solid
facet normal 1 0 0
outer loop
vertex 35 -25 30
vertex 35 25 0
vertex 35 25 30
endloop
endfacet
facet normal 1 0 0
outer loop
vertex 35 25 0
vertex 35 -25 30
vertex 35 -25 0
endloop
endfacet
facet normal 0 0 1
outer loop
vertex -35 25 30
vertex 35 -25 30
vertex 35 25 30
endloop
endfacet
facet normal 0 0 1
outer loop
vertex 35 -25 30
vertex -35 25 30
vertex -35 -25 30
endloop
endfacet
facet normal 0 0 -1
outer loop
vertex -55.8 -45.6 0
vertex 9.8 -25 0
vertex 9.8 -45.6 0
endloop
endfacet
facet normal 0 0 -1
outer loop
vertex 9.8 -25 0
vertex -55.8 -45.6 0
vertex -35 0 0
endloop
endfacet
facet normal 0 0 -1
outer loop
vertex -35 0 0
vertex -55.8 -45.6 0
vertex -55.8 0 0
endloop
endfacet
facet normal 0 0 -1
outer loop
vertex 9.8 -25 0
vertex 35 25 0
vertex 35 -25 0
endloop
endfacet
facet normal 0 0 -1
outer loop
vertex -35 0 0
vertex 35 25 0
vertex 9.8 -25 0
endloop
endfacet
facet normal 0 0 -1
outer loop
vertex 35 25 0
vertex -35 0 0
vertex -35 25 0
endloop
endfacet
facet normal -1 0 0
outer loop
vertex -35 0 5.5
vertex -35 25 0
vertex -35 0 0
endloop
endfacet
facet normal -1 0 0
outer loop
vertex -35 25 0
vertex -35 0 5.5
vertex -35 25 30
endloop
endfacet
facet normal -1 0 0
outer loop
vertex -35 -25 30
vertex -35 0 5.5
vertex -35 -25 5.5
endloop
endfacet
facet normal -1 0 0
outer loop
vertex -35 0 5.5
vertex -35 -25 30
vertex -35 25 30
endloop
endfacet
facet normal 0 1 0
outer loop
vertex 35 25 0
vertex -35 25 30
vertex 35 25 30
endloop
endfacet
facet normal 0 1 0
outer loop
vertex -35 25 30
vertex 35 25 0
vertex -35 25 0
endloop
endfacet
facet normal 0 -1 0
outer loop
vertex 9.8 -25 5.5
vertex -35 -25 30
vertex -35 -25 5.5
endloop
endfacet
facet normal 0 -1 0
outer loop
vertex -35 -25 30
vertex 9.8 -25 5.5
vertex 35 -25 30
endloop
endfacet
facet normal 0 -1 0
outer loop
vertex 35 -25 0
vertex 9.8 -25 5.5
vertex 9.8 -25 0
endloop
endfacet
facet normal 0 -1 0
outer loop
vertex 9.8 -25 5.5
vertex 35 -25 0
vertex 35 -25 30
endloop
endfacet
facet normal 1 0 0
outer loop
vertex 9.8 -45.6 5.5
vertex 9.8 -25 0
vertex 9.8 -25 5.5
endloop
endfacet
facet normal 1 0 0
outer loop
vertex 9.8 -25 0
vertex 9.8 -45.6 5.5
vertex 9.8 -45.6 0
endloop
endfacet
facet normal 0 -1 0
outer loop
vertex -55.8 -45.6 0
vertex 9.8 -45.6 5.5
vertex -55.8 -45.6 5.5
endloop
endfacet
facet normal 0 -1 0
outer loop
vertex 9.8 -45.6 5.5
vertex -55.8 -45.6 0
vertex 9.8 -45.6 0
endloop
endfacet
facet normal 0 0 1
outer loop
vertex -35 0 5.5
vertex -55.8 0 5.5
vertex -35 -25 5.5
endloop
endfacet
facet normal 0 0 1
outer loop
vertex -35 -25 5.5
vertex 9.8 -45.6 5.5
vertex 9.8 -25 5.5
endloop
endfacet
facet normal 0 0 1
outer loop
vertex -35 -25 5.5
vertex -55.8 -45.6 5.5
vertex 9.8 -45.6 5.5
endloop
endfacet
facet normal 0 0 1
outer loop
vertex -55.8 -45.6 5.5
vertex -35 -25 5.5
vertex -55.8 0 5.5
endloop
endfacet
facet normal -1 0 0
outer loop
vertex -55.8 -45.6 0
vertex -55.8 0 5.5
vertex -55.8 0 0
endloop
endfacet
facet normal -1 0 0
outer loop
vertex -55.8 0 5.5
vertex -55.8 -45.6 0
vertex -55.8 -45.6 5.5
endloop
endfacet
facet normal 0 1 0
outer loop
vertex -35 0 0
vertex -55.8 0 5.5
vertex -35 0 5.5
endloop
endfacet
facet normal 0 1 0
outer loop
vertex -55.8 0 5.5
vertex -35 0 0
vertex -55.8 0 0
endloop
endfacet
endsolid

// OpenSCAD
// Two-part enclosure for a small electronics board (e.g., Arduino-based temperature logger)
// Print orientation: both parts on the bed, side by side, with a 10 mm gap.
// Part 1 (left): open-top box. Part 2 (right): lid, printed upside down.

// ---------------- Parameters ----------------
box_x      = 70;    // box outer size in X (mm)
box_y      = 50;    // box outer size in Y (mm)
box_z      = 30;    // box outer size in Z (mm)
box_wall   = 2;     // box wall thickness (mm)
box_floor  = 2;     // box floor thickness (mm)

lip_w      = 65.6;  // lid lip outer size in X (mm)
lip_d      = 45.6;  // lid lip outer size in Y (mm)
lip_h      = 1.5;   // lid lip thickness (mm)
lip_t      = 4;     // lid plate thickness (mm)

gap        = 10;    // gap between box and lid on the bed (mm)
clearance  = 0.2;   // clearance between lid lip and box opening (mm)
eps        = 0.5;   // cutter overshoot past faces (mm)

$fn = 64;

// ---------------- Derived ----------------
box_h_internal = box_z - box_floor - box_wall;   // 27 mm internal height
lip_w_clear    = lip_w + 2 * clearance;          // 66 mm overall width (0.2 clearance each side)
lip_d_clear    = lip_d + 2 * clearance;          // 46 mm overall depth

// ---------------- Model ----------------
union() {
    // Part 1: Open-top box
    translate([-box_x / 2, -box_y / 2, 0])
        cube([box_x, box_y, box_z]);

    // Part 2: Lid, printed upside down.
    // Plate on the bed, lip on top of it, sliding into the box opening.
    translate([-(lip_w_clear / 2 - gap), -lip_d / 2, 0])
        linear_extrude(height = lip_t + lip_h)
            polygon([
                [-lip_w / 2, -lip_d / 2],
                [ lip_w / 2, -lip_d / 2],
                [ lip_w / 2,  lip_d / 2],
                [-lip_w / 2,  lip_d / 2]
            ]);

    // Cut the lip out except for the part that overlaps the plate (fusion)
    translate([-(lip_w / 2 + eps), -lip_d / 2 - eps, lip_t])
        cube([lip_w + 2 * eps, lip_d + 2 * eps, lip_h + eps]);
}
